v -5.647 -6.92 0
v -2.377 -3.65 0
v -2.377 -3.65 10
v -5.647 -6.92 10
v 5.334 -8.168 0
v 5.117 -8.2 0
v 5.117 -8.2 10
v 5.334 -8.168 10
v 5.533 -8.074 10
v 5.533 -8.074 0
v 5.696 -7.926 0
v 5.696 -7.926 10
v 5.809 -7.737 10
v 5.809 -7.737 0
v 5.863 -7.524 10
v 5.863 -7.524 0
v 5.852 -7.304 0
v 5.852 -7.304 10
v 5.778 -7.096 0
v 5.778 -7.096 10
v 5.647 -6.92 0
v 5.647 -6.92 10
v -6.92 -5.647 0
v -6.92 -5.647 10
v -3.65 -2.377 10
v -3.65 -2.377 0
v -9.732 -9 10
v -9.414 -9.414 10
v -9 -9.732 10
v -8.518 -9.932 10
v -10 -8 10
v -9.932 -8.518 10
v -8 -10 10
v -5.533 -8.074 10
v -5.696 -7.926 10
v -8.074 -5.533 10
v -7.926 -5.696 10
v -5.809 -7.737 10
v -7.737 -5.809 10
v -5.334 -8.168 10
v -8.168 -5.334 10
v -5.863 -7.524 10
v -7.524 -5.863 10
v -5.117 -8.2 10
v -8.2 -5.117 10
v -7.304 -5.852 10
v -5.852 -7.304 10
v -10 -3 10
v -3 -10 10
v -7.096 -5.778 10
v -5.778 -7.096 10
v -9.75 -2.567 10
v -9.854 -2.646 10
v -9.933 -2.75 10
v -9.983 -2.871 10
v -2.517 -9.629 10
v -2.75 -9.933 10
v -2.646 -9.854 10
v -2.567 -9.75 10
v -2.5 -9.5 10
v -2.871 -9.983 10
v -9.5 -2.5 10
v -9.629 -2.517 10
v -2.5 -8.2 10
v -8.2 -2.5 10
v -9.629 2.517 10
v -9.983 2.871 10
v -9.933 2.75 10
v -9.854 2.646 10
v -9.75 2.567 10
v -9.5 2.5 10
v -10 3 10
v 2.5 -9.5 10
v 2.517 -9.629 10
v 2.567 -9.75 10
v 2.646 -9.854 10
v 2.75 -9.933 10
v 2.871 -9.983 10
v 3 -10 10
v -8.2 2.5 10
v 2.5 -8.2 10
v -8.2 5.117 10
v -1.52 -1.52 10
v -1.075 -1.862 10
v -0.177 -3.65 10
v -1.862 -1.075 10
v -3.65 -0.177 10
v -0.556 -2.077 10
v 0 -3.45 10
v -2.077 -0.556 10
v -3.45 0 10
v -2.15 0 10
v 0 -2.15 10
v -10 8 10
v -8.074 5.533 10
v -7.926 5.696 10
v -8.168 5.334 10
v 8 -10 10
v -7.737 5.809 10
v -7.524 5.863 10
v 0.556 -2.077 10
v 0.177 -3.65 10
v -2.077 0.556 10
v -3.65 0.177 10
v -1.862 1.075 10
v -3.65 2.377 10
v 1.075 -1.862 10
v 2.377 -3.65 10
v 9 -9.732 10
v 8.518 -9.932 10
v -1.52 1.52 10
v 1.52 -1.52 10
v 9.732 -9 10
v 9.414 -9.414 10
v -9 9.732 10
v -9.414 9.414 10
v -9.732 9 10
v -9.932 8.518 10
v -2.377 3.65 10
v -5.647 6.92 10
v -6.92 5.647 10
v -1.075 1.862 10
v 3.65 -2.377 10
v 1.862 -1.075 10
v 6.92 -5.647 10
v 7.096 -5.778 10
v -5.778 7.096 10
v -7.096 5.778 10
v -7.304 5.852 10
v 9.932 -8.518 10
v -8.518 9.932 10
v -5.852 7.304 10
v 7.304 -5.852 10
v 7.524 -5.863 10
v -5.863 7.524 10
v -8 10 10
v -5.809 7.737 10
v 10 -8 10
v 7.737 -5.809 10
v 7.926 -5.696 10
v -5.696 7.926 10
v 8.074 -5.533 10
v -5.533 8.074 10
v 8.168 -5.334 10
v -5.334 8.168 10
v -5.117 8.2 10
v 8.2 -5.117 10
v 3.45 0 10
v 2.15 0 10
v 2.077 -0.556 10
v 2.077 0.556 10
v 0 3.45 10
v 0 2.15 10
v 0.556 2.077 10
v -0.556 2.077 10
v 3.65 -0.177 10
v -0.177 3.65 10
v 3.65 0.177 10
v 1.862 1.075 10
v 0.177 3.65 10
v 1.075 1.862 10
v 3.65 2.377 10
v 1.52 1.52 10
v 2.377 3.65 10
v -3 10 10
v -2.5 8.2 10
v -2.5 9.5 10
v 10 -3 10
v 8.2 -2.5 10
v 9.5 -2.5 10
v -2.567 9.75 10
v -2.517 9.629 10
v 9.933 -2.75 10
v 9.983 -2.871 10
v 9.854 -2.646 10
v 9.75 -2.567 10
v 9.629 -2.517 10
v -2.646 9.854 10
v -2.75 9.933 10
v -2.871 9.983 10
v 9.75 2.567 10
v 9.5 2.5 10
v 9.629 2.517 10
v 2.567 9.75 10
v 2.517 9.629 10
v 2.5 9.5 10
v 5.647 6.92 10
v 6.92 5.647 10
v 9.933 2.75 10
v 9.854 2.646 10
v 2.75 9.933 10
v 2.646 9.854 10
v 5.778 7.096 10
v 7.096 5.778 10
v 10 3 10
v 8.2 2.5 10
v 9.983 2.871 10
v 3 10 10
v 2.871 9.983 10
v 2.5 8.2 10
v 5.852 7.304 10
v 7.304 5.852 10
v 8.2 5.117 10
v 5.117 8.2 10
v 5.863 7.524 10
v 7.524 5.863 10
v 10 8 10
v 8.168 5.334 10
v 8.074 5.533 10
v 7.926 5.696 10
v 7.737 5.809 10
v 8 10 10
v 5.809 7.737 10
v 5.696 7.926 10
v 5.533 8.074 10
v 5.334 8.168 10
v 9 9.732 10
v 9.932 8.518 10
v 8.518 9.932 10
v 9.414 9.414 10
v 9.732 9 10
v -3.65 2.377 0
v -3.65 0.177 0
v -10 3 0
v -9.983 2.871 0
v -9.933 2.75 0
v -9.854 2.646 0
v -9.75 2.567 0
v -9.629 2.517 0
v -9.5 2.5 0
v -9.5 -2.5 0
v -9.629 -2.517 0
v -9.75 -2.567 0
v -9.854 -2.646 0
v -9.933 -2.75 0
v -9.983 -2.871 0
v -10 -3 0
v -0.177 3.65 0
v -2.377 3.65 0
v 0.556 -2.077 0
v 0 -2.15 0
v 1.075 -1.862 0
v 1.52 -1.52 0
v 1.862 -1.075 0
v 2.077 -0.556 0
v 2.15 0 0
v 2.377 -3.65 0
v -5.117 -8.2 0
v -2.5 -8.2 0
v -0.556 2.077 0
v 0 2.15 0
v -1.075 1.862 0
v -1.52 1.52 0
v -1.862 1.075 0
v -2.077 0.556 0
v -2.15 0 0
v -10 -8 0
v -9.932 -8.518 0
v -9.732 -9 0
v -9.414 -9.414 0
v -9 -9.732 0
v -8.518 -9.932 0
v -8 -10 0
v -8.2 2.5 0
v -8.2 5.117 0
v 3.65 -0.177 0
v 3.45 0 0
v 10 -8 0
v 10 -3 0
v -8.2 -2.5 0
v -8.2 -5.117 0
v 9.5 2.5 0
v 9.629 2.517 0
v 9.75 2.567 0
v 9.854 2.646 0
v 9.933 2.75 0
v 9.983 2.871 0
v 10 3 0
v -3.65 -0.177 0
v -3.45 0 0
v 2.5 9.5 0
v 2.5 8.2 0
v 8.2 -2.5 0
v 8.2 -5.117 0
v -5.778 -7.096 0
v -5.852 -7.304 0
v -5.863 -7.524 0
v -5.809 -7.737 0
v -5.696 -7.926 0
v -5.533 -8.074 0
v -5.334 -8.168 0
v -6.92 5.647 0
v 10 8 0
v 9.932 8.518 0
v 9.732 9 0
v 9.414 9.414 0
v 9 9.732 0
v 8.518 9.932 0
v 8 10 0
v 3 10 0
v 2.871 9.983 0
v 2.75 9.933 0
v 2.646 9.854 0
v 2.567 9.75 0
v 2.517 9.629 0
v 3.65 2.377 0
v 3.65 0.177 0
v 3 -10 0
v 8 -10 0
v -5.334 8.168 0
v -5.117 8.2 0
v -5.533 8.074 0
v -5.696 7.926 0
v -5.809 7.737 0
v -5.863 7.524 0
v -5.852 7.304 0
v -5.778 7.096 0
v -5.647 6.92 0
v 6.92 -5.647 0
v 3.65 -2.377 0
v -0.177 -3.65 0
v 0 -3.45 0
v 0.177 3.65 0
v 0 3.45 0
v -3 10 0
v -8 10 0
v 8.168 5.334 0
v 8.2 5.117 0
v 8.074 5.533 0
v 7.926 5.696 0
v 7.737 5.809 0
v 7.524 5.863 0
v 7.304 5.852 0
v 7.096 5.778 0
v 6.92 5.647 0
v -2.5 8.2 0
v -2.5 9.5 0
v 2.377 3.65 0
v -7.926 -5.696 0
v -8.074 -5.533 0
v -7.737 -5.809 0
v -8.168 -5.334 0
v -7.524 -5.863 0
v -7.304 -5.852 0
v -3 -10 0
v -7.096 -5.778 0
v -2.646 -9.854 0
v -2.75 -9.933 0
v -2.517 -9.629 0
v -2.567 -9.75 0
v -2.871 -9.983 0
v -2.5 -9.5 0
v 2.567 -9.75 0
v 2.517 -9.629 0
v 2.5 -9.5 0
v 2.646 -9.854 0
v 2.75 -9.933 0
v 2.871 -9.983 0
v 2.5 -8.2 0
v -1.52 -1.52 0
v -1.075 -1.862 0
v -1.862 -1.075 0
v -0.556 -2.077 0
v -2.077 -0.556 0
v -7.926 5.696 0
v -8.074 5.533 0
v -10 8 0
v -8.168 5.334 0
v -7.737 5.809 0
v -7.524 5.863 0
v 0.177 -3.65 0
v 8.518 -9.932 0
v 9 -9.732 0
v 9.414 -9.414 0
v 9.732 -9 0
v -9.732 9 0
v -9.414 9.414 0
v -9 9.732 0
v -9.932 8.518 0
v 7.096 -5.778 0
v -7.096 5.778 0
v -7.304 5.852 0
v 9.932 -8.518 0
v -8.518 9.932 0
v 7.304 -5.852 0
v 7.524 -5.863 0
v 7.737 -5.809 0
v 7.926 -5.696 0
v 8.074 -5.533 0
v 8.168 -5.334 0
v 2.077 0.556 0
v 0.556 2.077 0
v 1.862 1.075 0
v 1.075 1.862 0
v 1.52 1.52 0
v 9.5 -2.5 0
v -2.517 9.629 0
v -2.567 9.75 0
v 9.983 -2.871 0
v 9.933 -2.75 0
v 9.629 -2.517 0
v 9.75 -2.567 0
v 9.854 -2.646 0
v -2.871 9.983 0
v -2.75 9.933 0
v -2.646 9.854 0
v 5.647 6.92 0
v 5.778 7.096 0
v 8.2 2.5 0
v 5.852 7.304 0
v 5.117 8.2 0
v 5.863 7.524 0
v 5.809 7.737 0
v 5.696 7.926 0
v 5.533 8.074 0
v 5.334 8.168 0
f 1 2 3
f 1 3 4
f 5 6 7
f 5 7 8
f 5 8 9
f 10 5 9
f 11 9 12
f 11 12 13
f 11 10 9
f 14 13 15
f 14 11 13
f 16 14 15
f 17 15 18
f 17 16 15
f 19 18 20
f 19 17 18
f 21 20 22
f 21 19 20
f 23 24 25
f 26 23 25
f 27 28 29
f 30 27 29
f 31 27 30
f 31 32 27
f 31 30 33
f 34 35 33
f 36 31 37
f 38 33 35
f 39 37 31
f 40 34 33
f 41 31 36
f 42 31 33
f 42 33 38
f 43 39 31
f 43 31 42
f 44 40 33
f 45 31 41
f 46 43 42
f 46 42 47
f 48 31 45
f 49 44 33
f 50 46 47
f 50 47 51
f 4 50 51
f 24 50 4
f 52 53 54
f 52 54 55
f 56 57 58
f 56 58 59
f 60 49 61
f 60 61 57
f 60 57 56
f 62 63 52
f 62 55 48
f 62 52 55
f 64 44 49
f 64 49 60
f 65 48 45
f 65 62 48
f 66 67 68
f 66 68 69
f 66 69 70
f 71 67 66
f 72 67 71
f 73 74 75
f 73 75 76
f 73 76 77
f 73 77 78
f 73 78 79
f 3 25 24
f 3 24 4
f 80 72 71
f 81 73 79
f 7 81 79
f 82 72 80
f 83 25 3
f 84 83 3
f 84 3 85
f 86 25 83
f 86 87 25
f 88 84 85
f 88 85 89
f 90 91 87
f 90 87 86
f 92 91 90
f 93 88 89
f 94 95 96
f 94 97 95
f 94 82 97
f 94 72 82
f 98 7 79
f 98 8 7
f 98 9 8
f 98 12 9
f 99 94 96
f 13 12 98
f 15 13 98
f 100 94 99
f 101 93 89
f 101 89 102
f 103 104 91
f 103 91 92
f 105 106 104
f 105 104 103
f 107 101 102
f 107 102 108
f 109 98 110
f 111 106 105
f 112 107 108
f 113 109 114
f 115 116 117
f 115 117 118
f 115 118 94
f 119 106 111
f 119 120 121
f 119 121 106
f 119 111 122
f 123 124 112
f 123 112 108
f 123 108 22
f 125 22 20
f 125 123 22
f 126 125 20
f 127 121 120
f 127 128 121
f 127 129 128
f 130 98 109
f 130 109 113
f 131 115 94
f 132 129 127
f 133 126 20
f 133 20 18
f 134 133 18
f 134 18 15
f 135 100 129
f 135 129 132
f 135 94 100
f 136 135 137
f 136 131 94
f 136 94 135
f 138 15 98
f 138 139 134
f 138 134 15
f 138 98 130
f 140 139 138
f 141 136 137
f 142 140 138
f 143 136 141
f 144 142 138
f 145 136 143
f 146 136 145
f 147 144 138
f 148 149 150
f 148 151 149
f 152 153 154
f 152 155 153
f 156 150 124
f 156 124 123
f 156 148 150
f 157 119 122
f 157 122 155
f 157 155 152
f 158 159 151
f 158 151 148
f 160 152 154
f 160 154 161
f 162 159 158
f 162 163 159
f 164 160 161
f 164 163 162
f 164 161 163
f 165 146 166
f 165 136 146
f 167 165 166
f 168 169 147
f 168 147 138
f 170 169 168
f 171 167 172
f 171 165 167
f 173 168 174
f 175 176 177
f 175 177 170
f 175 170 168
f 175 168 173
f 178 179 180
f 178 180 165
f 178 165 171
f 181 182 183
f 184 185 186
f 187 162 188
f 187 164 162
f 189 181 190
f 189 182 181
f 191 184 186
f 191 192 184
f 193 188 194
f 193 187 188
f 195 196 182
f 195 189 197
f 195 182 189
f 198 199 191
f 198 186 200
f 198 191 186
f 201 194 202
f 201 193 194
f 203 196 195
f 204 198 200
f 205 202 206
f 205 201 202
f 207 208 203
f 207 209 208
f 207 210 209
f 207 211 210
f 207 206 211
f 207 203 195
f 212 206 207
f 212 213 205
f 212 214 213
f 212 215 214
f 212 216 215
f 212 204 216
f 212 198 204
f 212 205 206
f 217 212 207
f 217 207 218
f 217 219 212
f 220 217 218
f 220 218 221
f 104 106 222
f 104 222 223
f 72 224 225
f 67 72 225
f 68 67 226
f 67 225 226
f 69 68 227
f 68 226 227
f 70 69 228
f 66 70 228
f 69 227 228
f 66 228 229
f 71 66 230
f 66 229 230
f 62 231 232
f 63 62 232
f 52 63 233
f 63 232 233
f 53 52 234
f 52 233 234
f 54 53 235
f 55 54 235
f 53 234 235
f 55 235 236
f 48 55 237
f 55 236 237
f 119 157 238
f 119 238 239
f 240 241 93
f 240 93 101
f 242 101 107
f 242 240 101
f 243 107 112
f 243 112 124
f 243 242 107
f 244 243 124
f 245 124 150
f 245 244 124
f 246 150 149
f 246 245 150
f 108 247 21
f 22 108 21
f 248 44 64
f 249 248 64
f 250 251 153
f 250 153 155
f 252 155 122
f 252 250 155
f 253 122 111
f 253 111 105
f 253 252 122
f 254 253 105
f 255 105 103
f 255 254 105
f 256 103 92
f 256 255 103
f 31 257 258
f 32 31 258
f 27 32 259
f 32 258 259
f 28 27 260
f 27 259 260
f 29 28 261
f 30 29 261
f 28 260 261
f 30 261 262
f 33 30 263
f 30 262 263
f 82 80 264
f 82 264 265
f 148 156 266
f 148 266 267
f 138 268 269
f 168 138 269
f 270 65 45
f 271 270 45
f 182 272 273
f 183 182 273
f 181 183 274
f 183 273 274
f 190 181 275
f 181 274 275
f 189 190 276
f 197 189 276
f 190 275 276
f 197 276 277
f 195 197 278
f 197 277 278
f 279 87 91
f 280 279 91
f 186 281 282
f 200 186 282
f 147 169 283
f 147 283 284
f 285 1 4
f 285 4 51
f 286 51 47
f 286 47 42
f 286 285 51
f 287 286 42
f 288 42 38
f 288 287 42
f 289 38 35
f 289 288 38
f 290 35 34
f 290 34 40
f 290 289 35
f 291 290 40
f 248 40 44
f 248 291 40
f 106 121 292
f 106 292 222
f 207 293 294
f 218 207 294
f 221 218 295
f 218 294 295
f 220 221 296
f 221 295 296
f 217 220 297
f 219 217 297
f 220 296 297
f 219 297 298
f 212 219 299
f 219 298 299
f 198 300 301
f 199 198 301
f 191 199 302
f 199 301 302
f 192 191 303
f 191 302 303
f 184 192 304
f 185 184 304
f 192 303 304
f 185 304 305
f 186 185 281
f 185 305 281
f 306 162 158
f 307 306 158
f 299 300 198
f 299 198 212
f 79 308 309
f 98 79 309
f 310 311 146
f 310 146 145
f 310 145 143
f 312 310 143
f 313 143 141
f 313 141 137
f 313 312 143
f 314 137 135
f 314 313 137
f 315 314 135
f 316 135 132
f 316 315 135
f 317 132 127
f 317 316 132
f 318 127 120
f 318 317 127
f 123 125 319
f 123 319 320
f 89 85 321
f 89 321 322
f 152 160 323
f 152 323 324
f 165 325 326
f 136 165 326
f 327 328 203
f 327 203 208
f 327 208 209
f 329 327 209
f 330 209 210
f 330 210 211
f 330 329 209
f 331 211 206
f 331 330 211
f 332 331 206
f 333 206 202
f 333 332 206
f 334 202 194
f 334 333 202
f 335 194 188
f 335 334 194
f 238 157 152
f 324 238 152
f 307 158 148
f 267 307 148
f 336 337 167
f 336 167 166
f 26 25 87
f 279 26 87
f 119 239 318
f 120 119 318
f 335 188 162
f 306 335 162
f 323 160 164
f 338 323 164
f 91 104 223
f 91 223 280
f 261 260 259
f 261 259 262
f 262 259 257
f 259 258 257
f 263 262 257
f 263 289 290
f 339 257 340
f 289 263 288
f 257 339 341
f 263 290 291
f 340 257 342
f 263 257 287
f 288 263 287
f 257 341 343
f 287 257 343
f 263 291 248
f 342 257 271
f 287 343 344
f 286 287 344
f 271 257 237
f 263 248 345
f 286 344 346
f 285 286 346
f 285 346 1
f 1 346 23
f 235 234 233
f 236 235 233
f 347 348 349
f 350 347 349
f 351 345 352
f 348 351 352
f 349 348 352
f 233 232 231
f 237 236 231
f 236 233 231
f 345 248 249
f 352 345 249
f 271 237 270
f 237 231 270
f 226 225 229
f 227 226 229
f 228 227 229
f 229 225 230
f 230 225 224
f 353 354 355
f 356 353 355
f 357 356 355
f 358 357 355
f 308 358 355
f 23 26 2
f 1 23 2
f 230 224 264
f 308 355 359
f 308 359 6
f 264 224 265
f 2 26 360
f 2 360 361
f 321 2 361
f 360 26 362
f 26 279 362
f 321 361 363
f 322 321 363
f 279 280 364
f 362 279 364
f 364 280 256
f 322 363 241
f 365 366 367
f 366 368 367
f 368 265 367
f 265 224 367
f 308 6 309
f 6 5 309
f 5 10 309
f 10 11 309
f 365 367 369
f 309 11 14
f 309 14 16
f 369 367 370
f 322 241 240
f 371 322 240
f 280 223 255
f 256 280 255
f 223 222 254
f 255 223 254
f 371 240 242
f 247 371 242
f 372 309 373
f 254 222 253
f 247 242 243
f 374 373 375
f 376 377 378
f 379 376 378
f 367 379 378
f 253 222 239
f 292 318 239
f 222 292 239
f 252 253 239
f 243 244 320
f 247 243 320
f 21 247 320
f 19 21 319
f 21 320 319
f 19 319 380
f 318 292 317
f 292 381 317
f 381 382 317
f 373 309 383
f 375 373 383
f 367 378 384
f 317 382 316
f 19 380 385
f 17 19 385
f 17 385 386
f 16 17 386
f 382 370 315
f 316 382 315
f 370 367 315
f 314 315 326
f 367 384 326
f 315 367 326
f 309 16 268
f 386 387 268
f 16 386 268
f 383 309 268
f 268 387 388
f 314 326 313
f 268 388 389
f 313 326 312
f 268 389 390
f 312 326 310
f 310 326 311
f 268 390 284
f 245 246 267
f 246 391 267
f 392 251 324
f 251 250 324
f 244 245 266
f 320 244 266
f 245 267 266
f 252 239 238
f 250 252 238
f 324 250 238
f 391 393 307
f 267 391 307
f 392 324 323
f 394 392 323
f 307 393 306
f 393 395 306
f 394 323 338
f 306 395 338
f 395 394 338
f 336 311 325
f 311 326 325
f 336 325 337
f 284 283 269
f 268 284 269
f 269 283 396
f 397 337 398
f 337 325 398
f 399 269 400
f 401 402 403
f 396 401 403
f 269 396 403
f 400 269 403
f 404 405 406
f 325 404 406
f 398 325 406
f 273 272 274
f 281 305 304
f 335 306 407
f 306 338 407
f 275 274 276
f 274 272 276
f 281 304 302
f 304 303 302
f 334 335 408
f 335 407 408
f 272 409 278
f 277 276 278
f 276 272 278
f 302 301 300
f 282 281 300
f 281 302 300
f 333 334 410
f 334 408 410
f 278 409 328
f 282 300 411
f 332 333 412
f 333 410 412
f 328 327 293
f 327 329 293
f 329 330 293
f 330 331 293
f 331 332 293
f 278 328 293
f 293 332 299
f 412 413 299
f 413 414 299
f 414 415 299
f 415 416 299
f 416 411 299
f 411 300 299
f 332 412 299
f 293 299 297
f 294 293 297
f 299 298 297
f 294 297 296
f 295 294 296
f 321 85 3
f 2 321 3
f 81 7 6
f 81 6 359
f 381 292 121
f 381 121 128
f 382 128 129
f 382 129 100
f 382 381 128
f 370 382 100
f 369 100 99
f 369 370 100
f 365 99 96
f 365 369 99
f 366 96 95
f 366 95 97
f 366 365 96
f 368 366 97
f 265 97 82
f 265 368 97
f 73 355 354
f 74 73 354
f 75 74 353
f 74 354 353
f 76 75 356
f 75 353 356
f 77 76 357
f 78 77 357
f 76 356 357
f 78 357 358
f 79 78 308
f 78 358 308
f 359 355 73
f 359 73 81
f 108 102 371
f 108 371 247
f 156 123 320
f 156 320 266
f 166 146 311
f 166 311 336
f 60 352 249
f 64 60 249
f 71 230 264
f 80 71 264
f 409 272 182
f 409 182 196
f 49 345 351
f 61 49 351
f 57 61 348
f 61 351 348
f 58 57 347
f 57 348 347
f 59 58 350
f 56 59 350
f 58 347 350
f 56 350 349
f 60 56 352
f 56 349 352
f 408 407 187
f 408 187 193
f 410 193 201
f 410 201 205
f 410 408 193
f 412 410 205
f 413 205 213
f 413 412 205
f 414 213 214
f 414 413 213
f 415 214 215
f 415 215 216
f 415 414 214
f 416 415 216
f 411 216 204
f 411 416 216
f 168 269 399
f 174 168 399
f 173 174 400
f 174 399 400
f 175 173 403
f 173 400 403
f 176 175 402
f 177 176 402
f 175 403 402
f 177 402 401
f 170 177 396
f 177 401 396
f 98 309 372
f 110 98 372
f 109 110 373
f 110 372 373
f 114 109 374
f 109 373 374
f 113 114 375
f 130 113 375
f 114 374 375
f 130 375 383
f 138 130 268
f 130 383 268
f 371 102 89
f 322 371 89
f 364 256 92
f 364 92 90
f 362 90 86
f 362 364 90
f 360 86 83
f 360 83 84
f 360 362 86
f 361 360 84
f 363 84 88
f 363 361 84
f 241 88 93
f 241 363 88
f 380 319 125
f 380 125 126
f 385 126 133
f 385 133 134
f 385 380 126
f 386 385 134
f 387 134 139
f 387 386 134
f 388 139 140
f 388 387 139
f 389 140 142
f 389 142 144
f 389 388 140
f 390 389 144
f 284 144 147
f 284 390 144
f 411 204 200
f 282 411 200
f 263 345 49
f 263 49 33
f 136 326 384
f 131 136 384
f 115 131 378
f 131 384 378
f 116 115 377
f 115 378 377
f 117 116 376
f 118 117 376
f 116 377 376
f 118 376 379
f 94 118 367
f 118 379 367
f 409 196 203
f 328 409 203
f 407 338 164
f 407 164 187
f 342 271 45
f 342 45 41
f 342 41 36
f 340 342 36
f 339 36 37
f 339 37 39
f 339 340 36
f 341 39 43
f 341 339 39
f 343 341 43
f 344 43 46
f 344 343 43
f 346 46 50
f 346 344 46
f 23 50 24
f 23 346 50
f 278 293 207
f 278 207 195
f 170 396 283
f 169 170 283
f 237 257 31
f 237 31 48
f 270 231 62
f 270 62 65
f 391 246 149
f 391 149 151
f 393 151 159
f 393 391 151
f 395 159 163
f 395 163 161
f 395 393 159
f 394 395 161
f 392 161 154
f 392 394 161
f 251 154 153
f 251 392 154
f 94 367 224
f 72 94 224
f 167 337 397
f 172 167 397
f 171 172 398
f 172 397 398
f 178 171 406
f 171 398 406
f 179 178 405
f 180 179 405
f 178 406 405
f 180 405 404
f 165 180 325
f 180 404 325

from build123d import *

# Parameters (mm, degrees)
PAD_DEPTH = 10


with BuildPart() as part:
    # CopySketch029 → Pad (new body)
    with BuildSketch(Plane.XY):
        with BuildLine():
            Line((-2.377208, 3.65), (-5.646878, 6.91967))
            ThreePointArc((-5.116548, 8.2), (-5.809457, 7.737013), (-5.646878, 6.91967))
            Line((-5.116548, 8.2), (-2.5, 8.2))
            Line((-2.5, 9.5), (-2.5, 8.2))
            ThreePointArc((-2.5, 9.5), (-2.646447, 9.853553), (-3, 10))
            Line((-3, 10), (-8, 10))
            ThreePointArc((-8, 10), (-9.414214, 9.414214), (-10, 8))
            Line((-10, 8), (-10, 3))
            ThreePointArc((-10, 3), (-9.853553, 2.646447), (-9.5, 2.5))
            Line((-9.5, 2.5), (-8.2, 2.5))
            Line((-8.2, 2.5), (-8.2, 5.116548))
            ThreePointArc((-6.91967, 5.646878), (-7.737013, 5.809457), (-8.2, 5.116548))
            Line((-6.91967, 5.646878), (-3.65, 2.377208))
            Line((-3.65, 2.377208), (-3.65, 0.177208))
            Line((-3.65, 0.177208), (-3.45, 0))
            Line((-3.45, 0), (-2.15, 0))
            ThreePointArc((0, 2.15), (-1.52028, 1.52028), (-2.15, 0))
            Line((0, 3.45), (0, 2.15))
            Line((-0.177208, 3.65), (0, 3.45))
            Line((-0.177208, 3.65), (-2.377208, 3.65))
        make_face()
        with BuildLine():
            Line((2.377208, 3.65), (5.646878, 6.91967))
            ThreePointArc((5.646878, 6.91967), (5.809457, 7.737013), (5.116548, 8.2))
            Line((5.116548, 8.2), (2.5, 8.2))
            Line((2.5, 9.5), (2.5, 8.2))
            ThreePointArc((3, 10), (2.646447, 9.853553), (2.5, 9.5))
            Line((3, 10), (8, 10))
            ThreePointArc((10, 8), (9.414214, 9.414214), (8, 10))
            Line((10, 8), (10, 3))
            ThreePointArc((9.5, 2.5), (9.853553, 2.646447), (10, 3))
            Line((9.5, 2.5), (8.2, 2.5))
            Line((8.2, 2.5), (8.2, 5.116548))
            ThreePointArc((8.2, 5.116548), (7.737013, 5.809457), (6.91967, 5.646878))
            Line((6.91967, 5.646878), (3.65, 2.377208))
            Line((3.65, 2.377208), (3.65, 0.177208))
            Line((3.65, 0.177208), (3.45, 0))
            Line((3.45, 0), (2.15, 0))
            ThreePointArc((2.15, 0), (1.52028, 1.52028), (0, 2.15))
            Line((0, 3.45), (0, 2.15))
            Line((0.177208, 3.65), (0, 3.45))
            Line((0.177208, 3.65), (2.377208, 3.65))
        make_face()
        with BuildLine():
            Line((-2.377208, -3.65), (-5.646878, -6.91967))
            ThreePointArc((-5.646878, -6.91967), (-5.809457, -7.737013), (-5.116548, -8.2))
            Line((-5.116548, -8.2), (-2.5, -8.2))
            Line((-2.5, -9.5), (-2.5, -8.2))
            ThreePointArc((-3, -10), (-2.646447, -9.853553), (-2.5, -9.5))
            Line((-3, -10), (-8, -10))
            ThreePointArc((-10, -8), (-9.414214, -9.414214), (-8, -10))
            Line((-10, -8), (-10, -3))
            ThreePointArc((-9.5, -2.5), (-9.853553, -2.646447), (-10, -3))
            Line((-9.5, -2.5), (-8.2, -2.5))
            Line((-8.2, -2.5), (-8.2, -5.116548))
            ThreePointArc((-8.2, -5.116548), (-7.737013, -5.809457), (-6.91967, -5.646878))
            Line((-6.91967, -5.646878), (-3.65, -2.377208))
            Line((-3.65, -2.377208), (-3.65, -0.177208))
            Line((-3.65, -0.177208), (-3.45, 0))
            Line((-3.45, 0), (-2.15, 0))
            ThreePointArc((-2.15, 0), (-1.52028, -1.52028), (0, -2.15))
            Line((0, -3.45), (0, -2.15))
            Line((-0.177208, -3.65), (0, -3.45))
            Line((-0.177208, -3.65), (-2.377208, -3.65))
        make_face()
        with BuildLine():
            Line((2.377208, -3.65), (5.646878, -6.91967))
            ThreePointArc((5.116548, -8.2), (5.809457, -7.737013), (5.646878, -6.91967))
            Line((5.116548, -8.2), (2.5, -8.2))
            Line((2.5, -9.5), (2.5, -8.2))
            ThreePointArc((2.5, -9.5), (2.646447, -9.853553), (3, -10))
            Line((3, -10), (8, -10))
            ThreePointArc((8, -10), (9.414214, -9.414214), (10, -8))
            Line((10, -8), (10, -3))
            ThreePointArc((10, -3), (9.853553, -2.646447), (9.5, -2.5))
            Line((9.5, -2.5), (8.2, -2.5))
            Line((8.2, -2.5), (8.2, -5.116548))
            ThreePointArc((6.91967, -5.646878), (7.737013, -5.809457), (8.2, -5.116548))
            Line((6.91967, -5.646878), (3.65, -2.377208))
            Line((3.65, -2.377208), (3.65, -0.177208))
            Line((3.65, -0.177208), (3.45, 0))
            Line((3.45, 0), (2.15, 0))
            ThreePointArc((0, -2.15), (1.52028, -1.52028), (2.15, 0))
            Line((0, -3.45), (0, -2.15))
            Line((0.177208, -3.65), (0, -3.45))
            Line((0.177208, -3.65), (2.377208, -3.65))
        make_face()
    extrude(amount=PAD_DEPTH)


solid = part.part
